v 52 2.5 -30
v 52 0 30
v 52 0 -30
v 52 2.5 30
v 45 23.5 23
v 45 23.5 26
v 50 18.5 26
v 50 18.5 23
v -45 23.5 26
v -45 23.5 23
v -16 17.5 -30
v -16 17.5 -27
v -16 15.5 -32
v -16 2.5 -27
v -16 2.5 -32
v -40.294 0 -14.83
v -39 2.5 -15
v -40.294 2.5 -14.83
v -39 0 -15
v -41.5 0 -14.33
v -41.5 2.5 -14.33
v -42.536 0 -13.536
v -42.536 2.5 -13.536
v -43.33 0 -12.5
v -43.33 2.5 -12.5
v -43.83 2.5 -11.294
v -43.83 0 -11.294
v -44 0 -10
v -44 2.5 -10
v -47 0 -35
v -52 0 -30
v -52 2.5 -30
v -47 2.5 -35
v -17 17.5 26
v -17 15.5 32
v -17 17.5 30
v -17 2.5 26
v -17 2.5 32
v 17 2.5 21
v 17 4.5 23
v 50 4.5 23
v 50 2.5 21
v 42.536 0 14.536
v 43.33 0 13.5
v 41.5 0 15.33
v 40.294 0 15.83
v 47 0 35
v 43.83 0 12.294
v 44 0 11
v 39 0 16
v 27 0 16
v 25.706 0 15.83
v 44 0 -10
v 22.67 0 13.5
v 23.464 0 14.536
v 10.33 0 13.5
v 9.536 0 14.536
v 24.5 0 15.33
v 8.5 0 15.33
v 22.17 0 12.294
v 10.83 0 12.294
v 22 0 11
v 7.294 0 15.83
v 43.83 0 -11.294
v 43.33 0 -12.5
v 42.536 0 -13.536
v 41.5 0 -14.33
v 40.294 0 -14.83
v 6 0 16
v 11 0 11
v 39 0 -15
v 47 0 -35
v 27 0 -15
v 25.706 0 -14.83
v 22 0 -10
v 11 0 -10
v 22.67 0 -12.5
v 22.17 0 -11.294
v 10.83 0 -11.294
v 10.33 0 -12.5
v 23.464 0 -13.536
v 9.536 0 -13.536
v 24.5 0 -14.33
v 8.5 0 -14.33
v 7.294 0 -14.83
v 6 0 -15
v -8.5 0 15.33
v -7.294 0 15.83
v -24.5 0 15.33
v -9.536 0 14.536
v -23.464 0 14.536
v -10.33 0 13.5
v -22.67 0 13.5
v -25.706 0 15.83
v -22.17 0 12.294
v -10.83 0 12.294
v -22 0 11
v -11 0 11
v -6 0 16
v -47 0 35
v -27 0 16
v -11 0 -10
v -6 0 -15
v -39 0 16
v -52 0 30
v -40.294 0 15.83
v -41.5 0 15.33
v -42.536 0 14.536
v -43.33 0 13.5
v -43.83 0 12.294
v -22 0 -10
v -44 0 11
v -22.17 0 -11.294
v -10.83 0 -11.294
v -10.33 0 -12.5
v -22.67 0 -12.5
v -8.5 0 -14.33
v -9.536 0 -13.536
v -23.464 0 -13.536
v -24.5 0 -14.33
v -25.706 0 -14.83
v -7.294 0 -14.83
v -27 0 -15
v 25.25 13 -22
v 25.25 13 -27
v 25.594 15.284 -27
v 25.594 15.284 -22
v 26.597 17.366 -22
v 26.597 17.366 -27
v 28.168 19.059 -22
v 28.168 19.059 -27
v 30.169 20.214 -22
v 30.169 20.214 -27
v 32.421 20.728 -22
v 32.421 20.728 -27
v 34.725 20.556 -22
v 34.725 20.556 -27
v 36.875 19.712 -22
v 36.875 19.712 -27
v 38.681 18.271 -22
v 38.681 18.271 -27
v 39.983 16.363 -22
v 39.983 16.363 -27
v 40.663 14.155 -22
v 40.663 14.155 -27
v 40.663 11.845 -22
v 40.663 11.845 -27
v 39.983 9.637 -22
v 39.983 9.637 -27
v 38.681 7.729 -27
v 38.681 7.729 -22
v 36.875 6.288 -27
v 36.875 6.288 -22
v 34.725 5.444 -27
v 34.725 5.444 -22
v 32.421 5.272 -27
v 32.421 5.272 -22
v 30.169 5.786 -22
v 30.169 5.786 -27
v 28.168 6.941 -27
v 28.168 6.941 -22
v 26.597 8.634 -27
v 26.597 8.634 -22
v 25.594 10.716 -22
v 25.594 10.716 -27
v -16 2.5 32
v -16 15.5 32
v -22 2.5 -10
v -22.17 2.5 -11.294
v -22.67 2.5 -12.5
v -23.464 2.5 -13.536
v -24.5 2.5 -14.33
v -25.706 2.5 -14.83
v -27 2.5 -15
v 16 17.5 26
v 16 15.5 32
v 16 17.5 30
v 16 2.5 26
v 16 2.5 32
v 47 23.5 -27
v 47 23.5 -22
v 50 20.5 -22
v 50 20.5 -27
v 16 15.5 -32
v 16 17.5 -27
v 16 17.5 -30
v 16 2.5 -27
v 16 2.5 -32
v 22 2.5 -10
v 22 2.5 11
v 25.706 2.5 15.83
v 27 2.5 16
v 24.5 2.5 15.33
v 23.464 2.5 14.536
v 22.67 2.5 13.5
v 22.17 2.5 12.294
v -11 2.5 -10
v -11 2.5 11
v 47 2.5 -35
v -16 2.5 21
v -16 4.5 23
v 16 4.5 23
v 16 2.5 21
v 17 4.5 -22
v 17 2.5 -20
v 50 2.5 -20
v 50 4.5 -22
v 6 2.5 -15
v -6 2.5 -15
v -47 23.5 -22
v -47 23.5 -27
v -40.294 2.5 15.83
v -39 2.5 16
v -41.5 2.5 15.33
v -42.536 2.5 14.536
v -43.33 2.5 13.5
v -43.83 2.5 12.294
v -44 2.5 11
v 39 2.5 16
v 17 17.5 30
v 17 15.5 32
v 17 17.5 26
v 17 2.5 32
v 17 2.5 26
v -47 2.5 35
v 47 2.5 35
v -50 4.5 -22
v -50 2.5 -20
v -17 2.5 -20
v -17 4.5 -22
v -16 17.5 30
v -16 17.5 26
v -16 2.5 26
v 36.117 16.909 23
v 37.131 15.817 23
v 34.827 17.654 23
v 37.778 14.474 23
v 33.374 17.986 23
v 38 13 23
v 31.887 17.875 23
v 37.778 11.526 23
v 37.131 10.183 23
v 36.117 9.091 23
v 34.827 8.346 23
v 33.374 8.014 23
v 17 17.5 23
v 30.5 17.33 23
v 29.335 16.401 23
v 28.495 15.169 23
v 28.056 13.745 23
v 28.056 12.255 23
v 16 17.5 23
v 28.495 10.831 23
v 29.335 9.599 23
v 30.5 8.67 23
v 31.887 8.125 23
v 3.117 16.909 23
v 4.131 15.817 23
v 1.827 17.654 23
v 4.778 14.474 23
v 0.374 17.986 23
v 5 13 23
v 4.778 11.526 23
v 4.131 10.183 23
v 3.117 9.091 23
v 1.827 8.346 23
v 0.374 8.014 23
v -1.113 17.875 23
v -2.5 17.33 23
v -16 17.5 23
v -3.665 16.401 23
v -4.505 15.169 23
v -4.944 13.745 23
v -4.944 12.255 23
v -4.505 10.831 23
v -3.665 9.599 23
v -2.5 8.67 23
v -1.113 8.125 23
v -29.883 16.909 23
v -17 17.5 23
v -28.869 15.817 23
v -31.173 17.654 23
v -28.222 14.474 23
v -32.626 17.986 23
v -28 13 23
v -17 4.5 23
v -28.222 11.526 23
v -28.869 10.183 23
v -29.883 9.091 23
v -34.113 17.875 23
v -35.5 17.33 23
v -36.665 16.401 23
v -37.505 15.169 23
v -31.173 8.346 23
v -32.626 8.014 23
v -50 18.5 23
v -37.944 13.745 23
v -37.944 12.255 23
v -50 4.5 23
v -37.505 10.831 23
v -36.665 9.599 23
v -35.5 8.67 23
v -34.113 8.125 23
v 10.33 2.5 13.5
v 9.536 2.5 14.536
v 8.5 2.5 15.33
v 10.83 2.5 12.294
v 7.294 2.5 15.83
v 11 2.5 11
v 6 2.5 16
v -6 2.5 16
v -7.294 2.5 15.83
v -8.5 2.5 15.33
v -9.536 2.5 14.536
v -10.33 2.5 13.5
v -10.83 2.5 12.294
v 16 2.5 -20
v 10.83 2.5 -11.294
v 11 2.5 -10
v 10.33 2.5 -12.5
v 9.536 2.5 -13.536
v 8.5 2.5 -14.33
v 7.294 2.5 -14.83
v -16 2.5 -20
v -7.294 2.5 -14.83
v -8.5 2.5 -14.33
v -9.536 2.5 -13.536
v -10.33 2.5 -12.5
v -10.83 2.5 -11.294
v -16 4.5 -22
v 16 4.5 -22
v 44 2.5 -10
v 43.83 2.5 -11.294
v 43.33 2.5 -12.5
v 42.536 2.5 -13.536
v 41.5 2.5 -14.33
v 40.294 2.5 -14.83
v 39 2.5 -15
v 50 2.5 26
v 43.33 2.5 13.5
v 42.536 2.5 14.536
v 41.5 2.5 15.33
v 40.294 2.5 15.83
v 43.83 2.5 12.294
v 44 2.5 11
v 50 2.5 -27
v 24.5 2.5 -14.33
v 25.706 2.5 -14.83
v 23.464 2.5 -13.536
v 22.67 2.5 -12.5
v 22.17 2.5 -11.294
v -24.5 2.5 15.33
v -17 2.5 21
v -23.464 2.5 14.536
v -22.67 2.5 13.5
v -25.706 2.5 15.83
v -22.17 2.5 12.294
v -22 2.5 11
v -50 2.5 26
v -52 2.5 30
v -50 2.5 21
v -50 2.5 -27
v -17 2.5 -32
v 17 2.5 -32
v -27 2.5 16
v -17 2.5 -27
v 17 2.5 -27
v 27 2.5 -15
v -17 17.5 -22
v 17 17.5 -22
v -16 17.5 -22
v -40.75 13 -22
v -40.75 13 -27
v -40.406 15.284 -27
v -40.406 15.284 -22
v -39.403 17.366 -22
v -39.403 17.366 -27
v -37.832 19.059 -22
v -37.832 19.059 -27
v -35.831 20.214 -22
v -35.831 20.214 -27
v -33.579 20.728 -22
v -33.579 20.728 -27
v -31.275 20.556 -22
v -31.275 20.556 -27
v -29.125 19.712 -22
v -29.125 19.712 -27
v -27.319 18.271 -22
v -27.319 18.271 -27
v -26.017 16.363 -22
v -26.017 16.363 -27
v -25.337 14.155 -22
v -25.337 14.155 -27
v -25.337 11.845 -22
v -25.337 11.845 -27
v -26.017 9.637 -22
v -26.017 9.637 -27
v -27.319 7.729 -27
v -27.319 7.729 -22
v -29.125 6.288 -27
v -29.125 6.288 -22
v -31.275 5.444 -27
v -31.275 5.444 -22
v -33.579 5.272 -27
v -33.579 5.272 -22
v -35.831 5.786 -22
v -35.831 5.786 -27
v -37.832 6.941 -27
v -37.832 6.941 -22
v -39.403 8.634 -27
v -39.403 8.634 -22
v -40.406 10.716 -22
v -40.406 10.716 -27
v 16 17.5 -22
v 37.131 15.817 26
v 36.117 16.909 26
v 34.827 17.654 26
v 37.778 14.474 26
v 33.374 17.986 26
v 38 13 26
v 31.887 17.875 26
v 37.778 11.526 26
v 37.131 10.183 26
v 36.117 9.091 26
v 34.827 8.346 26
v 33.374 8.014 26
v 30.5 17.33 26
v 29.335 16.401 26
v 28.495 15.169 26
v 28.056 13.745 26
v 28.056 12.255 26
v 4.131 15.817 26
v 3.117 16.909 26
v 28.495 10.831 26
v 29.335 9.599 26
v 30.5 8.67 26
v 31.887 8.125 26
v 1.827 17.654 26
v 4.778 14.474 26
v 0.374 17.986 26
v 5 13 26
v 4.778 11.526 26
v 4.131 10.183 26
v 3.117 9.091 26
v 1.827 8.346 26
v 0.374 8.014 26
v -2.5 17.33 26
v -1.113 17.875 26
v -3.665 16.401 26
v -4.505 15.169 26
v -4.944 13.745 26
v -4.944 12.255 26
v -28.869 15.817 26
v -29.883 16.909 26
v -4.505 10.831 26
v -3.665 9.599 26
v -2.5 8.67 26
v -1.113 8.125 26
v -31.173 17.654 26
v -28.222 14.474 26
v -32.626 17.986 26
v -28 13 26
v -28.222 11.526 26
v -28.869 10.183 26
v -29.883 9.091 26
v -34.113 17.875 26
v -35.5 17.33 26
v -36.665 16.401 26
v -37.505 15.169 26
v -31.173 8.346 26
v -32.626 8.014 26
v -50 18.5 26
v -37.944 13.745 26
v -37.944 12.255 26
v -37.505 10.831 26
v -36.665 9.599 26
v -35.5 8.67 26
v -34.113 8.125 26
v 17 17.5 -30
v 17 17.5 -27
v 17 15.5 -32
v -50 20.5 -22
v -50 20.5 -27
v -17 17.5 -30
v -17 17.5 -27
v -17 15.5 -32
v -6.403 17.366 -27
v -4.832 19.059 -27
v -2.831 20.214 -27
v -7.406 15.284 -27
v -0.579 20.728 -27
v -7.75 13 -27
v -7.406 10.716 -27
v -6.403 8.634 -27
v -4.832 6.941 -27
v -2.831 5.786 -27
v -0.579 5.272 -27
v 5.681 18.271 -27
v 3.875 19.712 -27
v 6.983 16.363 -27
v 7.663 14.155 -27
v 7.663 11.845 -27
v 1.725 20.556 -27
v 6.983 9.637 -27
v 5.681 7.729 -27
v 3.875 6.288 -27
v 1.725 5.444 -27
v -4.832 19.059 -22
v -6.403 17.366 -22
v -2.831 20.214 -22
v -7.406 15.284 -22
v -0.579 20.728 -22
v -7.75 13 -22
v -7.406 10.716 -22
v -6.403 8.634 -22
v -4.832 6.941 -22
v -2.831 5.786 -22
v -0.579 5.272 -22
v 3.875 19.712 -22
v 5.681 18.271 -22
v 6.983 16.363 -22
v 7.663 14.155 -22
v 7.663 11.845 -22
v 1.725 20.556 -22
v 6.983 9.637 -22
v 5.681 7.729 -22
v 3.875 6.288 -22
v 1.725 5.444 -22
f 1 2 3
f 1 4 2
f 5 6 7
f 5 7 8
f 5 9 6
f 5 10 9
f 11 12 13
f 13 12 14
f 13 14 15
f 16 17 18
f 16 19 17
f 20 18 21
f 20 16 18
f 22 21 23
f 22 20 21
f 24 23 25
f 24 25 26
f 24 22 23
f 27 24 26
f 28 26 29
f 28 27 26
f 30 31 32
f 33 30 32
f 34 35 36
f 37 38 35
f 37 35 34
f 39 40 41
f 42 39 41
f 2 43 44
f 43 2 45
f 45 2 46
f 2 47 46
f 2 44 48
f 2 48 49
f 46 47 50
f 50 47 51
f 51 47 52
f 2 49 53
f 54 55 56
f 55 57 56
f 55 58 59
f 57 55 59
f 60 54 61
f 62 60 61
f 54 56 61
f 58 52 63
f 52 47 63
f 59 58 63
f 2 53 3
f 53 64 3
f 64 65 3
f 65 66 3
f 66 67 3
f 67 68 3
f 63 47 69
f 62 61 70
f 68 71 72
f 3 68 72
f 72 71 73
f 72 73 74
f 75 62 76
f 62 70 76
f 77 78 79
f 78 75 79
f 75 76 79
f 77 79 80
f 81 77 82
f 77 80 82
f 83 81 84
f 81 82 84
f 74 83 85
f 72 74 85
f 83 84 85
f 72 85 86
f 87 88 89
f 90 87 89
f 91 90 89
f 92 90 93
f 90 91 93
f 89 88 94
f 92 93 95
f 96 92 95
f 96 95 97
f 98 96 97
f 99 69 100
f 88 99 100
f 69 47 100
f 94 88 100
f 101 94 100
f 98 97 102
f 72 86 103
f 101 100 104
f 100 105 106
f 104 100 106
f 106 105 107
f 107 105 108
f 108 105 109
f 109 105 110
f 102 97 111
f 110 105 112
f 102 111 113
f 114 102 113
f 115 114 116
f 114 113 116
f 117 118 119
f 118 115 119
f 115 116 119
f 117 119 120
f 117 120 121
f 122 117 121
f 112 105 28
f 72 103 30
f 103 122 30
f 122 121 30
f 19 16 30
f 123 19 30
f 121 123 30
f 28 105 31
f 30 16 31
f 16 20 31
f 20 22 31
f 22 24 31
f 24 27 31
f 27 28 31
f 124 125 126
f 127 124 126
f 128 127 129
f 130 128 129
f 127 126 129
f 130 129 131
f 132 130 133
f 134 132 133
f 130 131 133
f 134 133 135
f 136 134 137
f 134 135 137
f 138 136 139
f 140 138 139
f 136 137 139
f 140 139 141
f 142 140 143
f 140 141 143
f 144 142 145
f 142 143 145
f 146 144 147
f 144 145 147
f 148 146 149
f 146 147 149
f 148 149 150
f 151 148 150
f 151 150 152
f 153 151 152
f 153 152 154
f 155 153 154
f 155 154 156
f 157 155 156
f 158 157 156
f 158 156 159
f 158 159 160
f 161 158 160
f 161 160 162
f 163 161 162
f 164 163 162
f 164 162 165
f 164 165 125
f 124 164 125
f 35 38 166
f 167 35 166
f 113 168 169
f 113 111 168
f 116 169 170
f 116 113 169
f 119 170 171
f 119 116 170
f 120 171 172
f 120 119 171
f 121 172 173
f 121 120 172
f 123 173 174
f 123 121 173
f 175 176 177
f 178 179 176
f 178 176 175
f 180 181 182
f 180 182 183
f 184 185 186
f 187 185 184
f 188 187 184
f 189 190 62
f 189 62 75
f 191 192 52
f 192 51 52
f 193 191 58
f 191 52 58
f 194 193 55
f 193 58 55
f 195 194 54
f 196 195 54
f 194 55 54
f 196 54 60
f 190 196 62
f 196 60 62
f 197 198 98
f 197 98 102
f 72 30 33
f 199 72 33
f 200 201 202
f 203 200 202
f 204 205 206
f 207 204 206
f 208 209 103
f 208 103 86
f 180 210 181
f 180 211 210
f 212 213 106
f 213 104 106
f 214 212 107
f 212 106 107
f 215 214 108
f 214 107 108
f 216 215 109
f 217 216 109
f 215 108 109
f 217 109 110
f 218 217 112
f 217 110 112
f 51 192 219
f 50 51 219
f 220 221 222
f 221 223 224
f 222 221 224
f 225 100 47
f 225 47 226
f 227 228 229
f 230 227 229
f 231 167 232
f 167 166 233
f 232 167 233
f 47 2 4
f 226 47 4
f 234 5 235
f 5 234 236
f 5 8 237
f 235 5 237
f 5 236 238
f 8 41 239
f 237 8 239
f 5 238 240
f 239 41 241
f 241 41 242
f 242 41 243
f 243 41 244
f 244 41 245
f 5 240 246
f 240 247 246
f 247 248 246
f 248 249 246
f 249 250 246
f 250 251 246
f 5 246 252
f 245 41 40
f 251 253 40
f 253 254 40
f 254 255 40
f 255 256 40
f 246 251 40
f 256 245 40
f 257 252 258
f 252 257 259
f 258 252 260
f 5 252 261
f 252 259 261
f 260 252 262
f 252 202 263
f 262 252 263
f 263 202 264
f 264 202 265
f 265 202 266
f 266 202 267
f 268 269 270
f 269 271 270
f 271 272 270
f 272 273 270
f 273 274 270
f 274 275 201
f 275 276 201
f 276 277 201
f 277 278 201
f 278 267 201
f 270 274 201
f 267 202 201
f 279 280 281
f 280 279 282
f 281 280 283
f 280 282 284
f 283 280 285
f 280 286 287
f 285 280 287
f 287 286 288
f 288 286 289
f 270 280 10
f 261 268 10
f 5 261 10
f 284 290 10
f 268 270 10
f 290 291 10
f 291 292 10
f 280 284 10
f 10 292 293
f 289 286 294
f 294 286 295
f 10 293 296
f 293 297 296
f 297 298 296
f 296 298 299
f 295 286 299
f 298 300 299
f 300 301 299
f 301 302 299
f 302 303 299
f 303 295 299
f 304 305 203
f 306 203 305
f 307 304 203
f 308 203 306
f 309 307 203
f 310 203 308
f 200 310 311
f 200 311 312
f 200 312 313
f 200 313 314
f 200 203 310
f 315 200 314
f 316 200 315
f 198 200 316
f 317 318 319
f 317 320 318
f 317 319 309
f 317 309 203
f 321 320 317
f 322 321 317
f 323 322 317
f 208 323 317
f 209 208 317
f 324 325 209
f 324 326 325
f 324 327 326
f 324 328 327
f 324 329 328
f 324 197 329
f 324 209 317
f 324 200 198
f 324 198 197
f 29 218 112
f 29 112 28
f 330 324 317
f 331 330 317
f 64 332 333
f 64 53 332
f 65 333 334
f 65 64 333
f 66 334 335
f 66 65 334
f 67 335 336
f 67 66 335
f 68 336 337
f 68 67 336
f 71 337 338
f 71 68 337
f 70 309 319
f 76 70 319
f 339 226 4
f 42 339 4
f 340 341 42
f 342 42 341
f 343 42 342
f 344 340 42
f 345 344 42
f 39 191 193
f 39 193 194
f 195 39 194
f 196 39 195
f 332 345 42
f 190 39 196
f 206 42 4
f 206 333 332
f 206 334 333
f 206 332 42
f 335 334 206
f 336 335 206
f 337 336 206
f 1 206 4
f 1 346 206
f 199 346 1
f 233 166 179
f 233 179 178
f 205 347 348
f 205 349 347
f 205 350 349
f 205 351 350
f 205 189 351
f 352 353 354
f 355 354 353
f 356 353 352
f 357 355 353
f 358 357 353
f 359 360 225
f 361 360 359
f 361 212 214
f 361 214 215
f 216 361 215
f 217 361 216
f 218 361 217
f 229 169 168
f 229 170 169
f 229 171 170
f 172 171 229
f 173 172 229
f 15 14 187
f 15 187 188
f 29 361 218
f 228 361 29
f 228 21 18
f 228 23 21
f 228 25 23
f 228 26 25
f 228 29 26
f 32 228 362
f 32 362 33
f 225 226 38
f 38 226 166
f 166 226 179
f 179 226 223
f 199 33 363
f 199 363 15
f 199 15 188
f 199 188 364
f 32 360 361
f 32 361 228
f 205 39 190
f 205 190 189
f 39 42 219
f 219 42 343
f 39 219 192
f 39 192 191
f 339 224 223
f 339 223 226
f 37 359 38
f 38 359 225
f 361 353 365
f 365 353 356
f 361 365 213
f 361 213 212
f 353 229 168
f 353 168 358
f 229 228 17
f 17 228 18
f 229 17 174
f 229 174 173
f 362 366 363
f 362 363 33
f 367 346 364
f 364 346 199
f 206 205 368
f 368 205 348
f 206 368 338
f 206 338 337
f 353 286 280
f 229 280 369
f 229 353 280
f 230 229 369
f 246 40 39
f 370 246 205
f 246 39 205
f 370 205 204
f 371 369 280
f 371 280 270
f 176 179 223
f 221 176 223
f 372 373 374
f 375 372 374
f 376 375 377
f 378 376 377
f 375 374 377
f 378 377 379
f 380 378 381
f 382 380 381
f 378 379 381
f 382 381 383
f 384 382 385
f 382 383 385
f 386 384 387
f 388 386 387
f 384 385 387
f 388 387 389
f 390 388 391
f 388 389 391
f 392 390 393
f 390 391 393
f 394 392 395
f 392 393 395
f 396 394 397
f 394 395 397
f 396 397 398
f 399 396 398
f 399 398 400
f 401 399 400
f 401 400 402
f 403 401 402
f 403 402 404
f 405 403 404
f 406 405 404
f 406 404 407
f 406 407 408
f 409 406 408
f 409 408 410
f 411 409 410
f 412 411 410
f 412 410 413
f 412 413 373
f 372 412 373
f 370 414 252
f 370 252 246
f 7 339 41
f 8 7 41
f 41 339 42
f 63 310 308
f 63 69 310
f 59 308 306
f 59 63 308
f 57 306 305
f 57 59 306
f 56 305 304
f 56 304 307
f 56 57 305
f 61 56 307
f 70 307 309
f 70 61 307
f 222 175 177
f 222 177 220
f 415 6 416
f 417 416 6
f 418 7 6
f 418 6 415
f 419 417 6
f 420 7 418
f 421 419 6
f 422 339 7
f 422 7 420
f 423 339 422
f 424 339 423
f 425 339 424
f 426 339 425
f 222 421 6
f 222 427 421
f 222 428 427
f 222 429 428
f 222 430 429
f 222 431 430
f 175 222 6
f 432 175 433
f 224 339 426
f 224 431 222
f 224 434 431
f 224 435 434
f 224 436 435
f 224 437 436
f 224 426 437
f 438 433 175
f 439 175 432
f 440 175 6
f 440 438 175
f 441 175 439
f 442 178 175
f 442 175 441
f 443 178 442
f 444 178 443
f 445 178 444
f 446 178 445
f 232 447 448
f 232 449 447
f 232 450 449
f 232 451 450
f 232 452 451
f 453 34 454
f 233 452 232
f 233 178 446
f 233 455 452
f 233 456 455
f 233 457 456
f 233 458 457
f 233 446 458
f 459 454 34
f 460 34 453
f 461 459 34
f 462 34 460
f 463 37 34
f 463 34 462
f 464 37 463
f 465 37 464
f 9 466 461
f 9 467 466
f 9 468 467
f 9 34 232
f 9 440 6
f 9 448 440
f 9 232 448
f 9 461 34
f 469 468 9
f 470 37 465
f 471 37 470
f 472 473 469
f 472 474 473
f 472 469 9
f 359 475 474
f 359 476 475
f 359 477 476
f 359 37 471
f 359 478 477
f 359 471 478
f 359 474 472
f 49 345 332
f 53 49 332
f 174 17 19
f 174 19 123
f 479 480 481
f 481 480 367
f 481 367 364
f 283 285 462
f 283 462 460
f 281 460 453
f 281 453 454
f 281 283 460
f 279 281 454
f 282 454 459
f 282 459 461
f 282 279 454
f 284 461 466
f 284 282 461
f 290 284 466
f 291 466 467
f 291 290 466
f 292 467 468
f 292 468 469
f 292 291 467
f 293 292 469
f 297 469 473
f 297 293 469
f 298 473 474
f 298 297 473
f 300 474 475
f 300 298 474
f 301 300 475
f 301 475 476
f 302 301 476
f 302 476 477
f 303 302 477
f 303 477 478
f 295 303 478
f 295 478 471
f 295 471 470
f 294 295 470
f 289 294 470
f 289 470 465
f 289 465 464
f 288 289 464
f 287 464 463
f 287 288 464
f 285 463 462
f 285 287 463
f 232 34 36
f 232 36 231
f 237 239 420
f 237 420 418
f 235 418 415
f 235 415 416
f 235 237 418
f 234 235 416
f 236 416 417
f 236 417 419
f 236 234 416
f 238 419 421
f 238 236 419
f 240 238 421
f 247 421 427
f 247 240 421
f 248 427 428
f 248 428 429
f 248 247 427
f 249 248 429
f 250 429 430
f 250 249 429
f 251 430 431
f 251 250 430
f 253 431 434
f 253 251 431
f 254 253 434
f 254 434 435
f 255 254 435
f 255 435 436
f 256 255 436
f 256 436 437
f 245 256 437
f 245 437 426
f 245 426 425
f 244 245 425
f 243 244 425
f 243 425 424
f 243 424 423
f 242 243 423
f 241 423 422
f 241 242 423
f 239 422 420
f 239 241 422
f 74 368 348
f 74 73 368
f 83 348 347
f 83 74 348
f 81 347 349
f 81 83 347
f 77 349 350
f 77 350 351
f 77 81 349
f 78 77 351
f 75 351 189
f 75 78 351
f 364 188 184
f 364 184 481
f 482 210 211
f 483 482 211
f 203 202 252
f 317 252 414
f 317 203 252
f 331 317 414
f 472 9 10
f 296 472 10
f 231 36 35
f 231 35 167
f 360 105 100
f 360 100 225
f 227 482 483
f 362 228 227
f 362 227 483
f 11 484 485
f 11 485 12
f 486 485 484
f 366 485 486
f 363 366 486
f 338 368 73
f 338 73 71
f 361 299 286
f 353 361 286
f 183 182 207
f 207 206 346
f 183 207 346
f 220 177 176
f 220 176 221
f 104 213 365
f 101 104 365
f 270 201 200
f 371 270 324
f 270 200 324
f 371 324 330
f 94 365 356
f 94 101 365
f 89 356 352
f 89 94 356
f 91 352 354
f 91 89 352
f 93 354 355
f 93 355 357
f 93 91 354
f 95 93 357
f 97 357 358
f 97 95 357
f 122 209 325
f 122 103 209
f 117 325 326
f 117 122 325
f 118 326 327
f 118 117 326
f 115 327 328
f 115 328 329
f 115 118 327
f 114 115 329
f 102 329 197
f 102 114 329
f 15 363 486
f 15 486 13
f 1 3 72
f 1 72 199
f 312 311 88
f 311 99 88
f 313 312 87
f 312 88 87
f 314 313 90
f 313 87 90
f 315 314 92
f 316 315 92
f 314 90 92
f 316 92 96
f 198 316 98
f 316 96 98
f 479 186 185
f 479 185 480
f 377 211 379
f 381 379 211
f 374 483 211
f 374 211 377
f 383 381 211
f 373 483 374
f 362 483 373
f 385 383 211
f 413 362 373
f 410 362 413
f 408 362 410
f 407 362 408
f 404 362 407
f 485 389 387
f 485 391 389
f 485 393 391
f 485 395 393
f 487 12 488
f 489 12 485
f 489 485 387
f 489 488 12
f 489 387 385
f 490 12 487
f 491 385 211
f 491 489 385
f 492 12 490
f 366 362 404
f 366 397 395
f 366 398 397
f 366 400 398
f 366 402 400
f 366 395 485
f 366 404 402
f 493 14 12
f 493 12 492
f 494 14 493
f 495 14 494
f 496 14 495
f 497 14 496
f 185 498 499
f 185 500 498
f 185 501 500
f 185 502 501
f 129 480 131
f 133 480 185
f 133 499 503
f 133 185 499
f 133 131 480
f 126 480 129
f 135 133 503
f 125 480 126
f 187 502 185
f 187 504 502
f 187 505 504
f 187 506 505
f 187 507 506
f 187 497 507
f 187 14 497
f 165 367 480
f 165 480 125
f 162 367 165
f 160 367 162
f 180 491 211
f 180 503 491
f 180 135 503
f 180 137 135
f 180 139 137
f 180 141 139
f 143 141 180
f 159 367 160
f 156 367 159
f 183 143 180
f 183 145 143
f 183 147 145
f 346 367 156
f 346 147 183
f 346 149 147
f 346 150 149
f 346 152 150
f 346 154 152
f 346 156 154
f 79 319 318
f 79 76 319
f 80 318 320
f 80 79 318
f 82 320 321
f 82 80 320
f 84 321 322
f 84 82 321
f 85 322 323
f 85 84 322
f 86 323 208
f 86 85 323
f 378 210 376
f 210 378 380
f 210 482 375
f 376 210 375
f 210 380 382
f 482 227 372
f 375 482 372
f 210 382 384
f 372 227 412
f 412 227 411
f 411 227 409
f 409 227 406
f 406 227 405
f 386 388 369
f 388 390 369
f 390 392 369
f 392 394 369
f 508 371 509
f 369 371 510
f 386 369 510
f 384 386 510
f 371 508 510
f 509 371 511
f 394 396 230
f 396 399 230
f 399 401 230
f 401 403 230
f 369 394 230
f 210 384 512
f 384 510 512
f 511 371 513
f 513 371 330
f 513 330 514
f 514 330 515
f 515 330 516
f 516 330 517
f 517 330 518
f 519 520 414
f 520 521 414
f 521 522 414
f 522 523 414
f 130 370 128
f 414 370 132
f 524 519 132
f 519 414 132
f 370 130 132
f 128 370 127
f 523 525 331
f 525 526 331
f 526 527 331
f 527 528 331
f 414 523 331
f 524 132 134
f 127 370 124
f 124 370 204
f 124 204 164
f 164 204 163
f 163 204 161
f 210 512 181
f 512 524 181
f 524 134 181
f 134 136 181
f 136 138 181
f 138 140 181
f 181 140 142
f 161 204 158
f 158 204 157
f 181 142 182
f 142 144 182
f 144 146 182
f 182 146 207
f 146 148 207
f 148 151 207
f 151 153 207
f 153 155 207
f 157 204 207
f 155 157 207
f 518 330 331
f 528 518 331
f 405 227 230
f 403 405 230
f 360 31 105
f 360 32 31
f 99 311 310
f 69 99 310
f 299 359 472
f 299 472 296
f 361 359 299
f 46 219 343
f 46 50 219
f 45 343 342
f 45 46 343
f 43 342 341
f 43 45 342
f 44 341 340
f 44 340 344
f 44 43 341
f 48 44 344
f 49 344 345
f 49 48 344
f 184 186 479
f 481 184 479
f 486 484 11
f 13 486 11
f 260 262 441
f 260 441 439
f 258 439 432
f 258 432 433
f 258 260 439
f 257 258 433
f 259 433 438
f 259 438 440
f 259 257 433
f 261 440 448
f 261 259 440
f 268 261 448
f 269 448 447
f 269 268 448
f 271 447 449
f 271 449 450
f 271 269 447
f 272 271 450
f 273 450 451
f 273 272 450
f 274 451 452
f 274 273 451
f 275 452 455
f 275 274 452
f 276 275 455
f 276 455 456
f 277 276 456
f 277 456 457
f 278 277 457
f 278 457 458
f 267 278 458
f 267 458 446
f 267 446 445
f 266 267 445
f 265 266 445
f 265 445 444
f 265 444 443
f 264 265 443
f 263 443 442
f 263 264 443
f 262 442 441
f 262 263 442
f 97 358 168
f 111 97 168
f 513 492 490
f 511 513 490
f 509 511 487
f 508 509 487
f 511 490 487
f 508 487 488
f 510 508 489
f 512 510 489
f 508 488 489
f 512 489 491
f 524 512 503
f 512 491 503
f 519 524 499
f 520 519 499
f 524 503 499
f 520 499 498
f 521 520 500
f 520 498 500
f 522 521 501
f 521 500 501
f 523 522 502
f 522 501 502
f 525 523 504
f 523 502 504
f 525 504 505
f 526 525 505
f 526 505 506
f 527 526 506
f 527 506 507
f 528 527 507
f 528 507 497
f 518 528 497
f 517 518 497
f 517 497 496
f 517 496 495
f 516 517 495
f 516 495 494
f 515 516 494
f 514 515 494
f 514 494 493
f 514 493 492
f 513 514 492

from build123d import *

# Parameters (mm, degrees)
SKETCH1_W           = 100
SKETCH1_H           = 70
BOSS_EXTRUDE1_DEPTH = 2.5
SKETCH2_W           = 100
SKETCH2_H           = 5
SKETCH2_H_2         = 3
BOSS_EXTRUDE2_DEPTH = 21
SKETCH3_R           = 7.75
CUT_EXTRUDE1_DEPTH  = 61
BOSS_EXTRUDE3_START = -3
SKETCH4_R           = 7.75
SKETCH4_R_2         = 5
BOSS_EXTRUDE3_DEPTH = 3
SKETCH5_W           = 70
SKETCH5_H           = 2.5
BOSS_EXTRUDE4_DEPTH = 2
SKETCH6_W           = 70
SKETCH6_H           = 2.5
BOSS_EXTRUDE5_DEPTH = 2
CHAMFER1_SIZE       = 5
SKETCH9_W           = 1
SKETCH9_H           = 64
BOSS_EXTRUDE8_DEPTH = 15
CHAMFER3_SIZE       = 2
CHAMFER4_SIZE       = 3
CHAMFER5_SIZE       = 2
SKETCH11_W          = 22
SKETCH11_H          = 31
CUT_EXTRUDE2_DEPTH  = 10
FILLET1_R           = 5


with BuildPart() as part:
    # Sketch1 → Boss-Extrude1 (new body)
    with BuildSketch(Plane(origin=(0, 0, 0), x_dir=(1, 0, 0), z_dir=(0, 1, 0))):
        Rectangle(SKETCH1_W, SKETCH1_H)
    extrude(amount=BOSS_EXTRUDE1_DEPTH)

    # Sketch2 → Boss-Extrude2 (add)
    with BuildSketch(Plane(origin=(0, 2.5, 0), x_dir=(1, 0, 0), z_dir=(0, 1, 0))):
        with Locations((0, 24.5)):
            Rectangle(SKETCH2_W, SKETCH2_H)
        with Locations((0, -24.5)):
            Rectangle(SKETCH2_W, SKETCH2_H_2)
    extrude(amount=BOSS_EXTRUDE2_DEPTH)

    # Sketch3 → Cut-Extrude1 (cut)
    with BuildSketch(Plane(origin=(0, 0, -27), x_dir=(-1, 0, 0), z_dir=(0, 0, -1))):
        with Locations((-33, 13)):
            Circle(SKETCH3_R)
        with Locations((0, 13)):
            Circle(SKETCH3_R)
        with Locations((33, 13)):
            Circle(SKETCH3_R)
    extrude(amount=-CUT_EXTRUDE1_DEPTH, mode=Mode.SUBTRACT)

    # Sketch4 → Boss-Extrude3 (add)
    # profile 1 of 3: a face of its own
    with BuildSketch(Plane.XY.offset(26).offset(BOSS_EXTRUDE3_START)):
        with Locations(Location((-33, 13, 0), (0, 0, 180))):
            Circle(SKETCH4_R)
        with Locations((-33, 13)):
            Circle(SKETCH4_R_2, mode=Mode.SUBTRACT)
    # profile 2 of 3: a face of its own
    with BuildSketch(Plane.XY.offset(26).offset(BOSS_EXTRUDE3_START)):
        with Locations(Location((0, 13, 0), (0, 0, 180))):
            Circle(SKETCH4_R)
        with Locations((0, 13)):
            Circle(SKETCH4_R_2, mode=Mode.SUBTRACT)
    # profile 3 of 3: a face of its own
    with BuildSketch(Plane.XY.offset(26).offset(BOSS_EXTRUDE3_START)):
        with Locations(Location((33, 13, 0), (0, 0, 180))):
            Circle(SKETCH4_R)
        with Locations((33, 13)):
            Circle(SKETCH4_R_2, mode=Mode.SUBTRACT)
    extrude(amount=BOSS_EXTRUDE3_DEPTH)

    # Sketch5 → Boss-Extrude4 (add)
    with BuildSketch(Plane.ZY.offset(50)):
        with Locations((0, 1.25)):
            Rectangle(SKETCH5_W, SKETCH5_H)
    extrude(amount=BOSS_EXTRUDE4_DEPTH)

    # Sketch6 → Boss-Extrude5 (add)
    with BuildSketch(Plane(origin=(50, 0, 0), x_dir=(0, 0, -1), z_dir=(1, 0, 0))):
        with Locations((0, 1.25)):
            Rectangle(SKETCH6_W, SKETCH6_H)
    extrude(amount=BOSS_EXTRUDE5_DEPTH)

    # Chamfer1
    chamfer1_edges = [part.edges().sort_by_distance(p)[0] for p in [
        (52, 1.25, -35),
        (52, 1.25, 35),
        (-50, 23.5, 24.5),
        (50, 23.5, 24.5),
        (-52, 1.25, -35),
        (-52, 1.25, 35),
    ]]
    chamfer(chamfer1_edges, length=CHAMFER1_SIZE)

    # Sketch9 → Boss-Extrude8 (add)
    with BuildSketch(Plane(origin=(0, 2.5, 0), x_dir=(1, 0, 0), z_dir=(0, 1, 0))):
        with Locations((-16.5, 0)):
            Rectangle(SKETCH9_W, SKETCH9_H)
        with Locations((16.5, 0)):
            Rectangle(SKETCH9_W, SKETCH9_H)
    extrude(amount=BOSS_EXTRUDE8_DEPTH)

    # Chamfer3
    chamfer3_edges = [part.edges().sort_by_distance(p)[0] for p in [
        (-16.5, 17.5, -32),
        (-16.5, 17.5, 32),
        (16.5, 17.5, -32),
        (16.5, 17.5, 32),
    ]]
    chamfer(chamfer3_edges, length=CHAMFER3_SIZE)

    # Chamfer4
    chamfer4_edges = [part.edges().sort_by_distance(p)[0] for p in [
        (-50, 23.5, -24.5),
        (50, 23.5, -24.5),
    ]]
    chamfer(chamfer4_edges, length=CHAMFER4_SIZE)

    # Chamfer5
    chamfer5_edges = [part.edges().sort_by_distance(p)[0] for p in [
        (-33.5, 2.5, -22),
        (-33.5, 2.5, 23),
        (0, 2.5, -22),
        (0, 2.5, 23),
        (33.5, 2.5, -22),
        (33.5, 2.5, 23),
    ]]
    chamfer(chamfer5_edges, length=CHAMFER5_SIZE)

    # Sketch11 → Cut-Extrude2 (cut)
    with BuildSketch(Plane(origin=(0, 2.5, 0), x_dir=(1, 0, 0), z_dir=(0, 1, 0))):
        with Locations((0, -0.5)):
            Rectangle(SKETCH11_W, SKETCH11_H)
        with Locations((-33, -0.5)):
            Rectangle(SKETCH11_W, SKETCH11_H)
        with Locations((33, -0.5)):
            Rectangle(SKETCH11_W, SKETCH11_H)
    extrude(amount=-CUT_EXTRUDE2_DEPTH, mode=Mode.SUBTRACT)

    # Fillet1
    fillet1_edges = [part.edges().sort_by_distance(p)[0] for p in [
        (-11, 1.25, 16),
        (-11, 1.25, -15),
        (11, 1.25, -15),
        (11, 1.25, 16),
        (-22, 1.25, -15),
        (-22, 1.25, 16),
        (-44, 1.25, 16),
        (-44, 1.25, -15),
        (22, 1.25, 16),
        (22, 1.25, -15),
        (44, 1.25, -15),
        (44, 1.25, 16),
    ]]
    fillet(fillet1_edges, radius=FILLET1_R)


solid = part.part
